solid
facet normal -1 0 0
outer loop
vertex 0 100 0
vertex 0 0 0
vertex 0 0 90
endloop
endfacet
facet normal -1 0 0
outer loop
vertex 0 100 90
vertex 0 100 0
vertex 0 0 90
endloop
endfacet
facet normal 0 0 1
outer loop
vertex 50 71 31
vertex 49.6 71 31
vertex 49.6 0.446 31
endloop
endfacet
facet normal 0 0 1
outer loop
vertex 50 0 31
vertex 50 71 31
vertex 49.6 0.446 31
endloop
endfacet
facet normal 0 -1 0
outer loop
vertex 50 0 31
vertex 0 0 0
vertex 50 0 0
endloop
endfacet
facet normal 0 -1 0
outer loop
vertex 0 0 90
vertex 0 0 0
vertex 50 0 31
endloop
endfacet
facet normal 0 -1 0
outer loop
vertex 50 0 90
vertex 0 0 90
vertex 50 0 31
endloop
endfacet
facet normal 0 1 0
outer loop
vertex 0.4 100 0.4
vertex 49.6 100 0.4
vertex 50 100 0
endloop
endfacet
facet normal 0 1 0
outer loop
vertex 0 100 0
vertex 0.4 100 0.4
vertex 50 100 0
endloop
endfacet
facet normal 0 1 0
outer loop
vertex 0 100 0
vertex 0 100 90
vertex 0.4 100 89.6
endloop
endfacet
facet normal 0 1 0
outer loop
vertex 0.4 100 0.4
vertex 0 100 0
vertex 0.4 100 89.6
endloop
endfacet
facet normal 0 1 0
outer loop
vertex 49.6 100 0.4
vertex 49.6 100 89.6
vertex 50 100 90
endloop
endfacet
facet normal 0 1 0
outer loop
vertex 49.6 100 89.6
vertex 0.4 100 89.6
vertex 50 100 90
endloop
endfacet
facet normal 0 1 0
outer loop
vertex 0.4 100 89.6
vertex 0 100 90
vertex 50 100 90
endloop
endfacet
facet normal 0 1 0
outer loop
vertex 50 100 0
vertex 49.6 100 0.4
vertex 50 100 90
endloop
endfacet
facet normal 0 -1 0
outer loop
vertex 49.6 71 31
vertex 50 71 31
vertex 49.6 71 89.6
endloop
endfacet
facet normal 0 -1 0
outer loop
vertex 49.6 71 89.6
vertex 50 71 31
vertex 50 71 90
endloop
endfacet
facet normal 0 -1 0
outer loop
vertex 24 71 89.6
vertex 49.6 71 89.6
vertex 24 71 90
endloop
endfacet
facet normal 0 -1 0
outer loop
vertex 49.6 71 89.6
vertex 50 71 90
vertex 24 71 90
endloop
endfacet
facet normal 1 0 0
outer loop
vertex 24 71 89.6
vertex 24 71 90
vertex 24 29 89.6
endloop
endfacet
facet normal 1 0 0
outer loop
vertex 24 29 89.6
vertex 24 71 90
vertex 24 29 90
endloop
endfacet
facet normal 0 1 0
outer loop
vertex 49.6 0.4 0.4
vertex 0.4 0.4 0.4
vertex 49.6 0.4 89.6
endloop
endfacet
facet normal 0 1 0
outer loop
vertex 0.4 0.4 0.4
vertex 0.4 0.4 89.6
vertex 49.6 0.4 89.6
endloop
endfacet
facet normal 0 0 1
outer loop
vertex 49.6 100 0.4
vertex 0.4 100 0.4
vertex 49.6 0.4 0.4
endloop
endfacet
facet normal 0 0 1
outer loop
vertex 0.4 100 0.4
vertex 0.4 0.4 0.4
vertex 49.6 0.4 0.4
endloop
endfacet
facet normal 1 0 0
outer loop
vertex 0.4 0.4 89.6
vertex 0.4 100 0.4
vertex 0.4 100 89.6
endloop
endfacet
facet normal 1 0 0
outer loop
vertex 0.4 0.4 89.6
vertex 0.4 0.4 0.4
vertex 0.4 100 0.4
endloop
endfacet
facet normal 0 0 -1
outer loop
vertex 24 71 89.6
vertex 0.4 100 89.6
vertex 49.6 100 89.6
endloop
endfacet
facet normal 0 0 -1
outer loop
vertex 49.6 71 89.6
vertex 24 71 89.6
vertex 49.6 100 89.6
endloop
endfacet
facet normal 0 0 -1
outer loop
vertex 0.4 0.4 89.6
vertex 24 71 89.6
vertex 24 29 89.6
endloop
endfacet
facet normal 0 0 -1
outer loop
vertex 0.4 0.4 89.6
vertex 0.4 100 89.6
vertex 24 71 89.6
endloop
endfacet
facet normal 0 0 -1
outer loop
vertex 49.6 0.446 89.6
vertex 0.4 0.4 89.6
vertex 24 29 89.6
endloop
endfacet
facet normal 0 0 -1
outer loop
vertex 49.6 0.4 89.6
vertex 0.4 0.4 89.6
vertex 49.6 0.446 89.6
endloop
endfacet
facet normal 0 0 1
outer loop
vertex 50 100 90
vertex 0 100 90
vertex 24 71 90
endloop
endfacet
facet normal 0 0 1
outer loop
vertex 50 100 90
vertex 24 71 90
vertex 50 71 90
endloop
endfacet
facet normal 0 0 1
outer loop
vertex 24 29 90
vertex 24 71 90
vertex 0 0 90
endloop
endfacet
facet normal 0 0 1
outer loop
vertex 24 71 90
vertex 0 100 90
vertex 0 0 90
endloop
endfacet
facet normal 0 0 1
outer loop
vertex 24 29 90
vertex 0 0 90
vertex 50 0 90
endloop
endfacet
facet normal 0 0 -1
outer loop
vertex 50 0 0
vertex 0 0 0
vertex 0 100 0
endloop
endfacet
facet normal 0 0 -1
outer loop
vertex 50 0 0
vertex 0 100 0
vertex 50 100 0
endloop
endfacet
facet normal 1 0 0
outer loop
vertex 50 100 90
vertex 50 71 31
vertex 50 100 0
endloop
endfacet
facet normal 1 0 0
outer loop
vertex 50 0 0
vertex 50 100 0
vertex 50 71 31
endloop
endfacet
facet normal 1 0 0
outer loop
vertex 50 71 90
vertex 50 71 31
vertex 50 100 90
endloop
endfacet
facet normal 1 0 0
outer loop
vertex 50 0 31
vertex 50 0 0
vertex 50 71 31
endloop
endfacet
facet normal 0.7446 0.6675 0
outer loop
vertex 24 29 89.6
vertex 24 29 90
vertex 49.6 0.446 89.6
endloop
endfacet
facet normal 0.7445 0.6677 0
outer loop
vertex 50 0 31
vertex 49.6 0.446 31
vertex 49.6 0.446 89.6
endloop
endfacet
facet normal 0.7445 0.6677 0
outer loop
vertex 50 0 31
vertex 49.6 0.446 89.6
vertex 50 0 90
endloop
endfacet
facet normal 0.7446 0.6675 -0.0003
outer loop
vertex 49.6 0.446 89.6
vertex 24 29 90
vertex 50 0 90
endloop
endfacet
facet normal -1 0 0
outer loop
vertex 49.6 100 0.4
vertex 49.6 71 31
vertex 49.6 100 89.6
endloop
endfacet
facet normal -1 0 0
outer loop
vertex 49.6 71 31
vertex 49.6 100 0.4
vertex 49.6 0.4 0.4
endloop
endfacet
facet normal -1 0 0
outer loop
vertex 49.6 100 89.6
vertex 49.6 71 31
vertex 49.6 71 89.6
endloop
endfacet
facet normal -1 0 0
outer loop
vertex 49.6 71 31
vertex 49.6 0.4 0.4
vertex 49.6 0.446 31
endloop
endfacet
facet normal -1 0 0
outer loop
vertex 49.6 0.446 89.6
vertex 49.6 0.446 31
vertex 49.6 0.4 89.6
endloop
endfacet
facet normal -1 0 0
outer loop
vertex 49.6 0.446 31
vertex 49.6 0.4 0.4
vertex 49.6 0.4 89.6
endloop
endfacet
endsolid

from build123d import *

# Parameters (mm, degrees)
F0_W     = 50
F0_H     = 90
F1_DEPTH = 100
F2_T     = -0.4
F4_DEPTH = 59


with BuildPart() as f1:
    # F0 (on Front) → F1 (new body)
    with BuildSketch(Plane.XZ):
        with Locations((25, 45)):
            Rectangle(F0_W, F0_H)
    extrude(amount=-F1_DEPTH)

    # F2
    f2_openings = [f1.faces().sort_by_distance(p)[0] for p in [
        (25, 100, 45),
    ]]
    offset(amount=F2_T, openings=f2_openings)

    # F3 (on face) → F4 (cut)
    with BuildSketch(Plane.XY.offset(90)):
        Polygon((24, 29), (50, 0), (50, 71), (24, 71), align=None)
    extrude(amount=-F4_DEPTH, mode=Mode.SUBTRACT)


solid = f1.part
